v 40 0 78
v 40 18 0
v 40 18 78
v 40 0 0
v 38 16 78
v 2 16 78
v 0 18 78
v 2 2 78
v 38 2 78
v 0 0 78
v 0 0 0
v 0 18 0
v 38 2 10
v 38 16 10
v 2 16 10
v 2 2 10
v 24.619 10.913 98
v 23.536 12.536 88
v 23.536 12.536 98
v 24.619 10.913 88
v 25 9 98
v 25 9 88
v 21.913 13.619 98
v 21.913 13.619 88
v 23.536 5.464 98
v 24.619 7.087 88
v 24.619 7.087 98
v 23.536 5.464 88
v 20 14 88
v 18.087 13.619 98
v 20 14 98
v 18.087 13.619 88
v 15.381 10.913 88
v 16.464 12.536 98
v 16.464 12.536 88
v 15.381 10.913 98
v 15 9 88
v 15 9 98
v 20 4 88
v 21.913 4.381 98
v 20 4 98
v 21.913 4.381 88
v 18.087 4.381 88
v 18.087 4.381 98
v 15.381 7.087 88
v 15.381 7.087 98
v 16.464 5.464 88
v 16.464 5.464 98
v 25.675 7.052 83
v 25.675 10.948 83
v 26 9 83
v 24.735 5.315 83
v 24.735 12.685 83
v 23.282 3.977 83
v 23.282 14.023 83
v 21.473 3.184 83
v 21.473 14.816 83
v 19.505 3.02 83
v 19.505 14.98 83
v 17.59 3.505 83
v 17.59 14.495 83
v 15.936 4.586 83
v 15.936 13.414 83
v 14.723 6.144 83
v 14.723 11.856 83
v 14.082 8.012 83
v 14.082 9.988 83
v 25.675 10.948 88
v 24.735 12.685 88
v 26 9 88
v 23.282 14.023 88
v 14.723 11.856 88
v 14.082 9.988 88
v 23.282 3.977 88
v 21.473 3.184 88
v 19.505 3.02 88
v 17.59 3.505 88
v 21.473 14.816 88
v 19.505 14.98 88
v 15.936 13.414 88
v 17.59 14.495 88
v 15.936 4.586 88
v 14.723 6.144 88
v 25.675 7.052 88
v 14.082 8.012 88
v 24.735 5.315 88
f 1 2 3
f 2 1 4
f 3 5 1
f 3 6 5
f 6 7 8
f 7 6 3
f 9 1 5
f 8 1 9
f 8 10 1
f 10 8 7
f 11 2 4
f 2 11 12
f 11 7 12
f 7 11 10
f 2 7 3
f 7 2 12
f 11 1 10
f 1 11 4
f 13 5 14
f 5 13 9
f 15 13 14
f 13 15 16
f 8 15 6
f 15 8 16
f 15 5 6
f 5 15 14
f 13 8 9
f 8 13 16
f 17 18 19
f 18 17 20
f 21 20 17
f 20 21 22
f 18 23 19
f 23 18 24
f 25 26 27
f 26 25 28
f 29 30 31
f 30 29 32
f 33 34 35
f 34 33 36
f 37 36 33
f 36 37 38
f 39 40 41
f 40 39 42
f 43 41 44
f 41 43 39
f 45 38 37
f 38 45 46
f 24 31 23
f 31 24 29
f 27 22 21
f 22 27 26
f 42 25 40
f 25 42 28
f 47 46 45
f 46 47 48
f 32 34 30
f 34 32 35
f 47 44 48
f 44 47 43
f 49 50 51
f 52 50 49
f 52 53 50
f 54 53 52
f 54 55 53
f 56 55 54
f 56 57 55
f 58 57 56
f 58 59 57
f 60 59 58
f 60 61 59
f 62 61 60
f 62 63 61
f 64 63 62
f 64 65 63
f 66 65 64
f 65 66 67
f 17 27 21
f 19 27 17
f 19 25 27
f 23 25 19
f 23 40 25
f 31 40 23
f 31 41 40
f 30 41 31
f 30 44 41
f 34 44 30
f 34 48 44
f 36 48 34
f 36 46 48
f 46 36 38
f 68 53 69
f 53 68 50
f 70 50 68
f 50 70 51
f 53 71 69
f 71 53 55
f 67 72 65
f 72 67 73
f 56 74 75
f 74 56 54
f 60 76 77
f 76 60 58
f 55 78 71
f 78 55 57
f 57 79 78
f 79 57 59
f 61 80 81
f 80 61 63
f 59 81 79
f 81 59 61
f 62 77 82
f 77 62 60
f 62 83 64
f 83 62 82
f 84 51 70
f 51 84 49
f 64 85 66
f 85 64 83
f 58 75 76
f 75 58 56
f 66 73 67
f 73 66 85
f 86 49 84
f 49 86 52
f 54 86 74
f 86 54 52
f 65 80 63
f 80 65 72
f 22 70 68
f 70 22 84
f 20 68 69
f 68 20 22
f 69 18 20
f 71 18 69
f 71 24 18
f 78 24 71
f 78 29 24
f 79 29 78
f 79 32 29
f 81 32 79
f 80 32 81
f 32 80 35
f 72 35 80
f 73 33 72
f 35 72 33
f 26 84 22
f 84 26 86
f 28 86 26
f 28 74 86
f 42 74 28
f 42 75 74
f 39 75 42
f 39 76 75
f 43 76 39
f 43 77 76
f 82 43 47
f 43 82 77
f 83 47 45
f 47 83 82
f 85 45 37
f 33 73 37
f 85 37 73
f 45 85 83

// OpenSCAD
// Generated by SolidPython 1.0.0 on 2020-06-14 23:29:49


union() {
	difference() {
		color(c = [0.8500000000, 0.7000000000, 0.4500000000, 0.5000000000]) {
			cube(size = [40, 18, 78]);
		}
		color(c = [0.6500000000, 0.6700000000, 0.7200000000, 0.8000000000, 0.5000000000]) {
			translate(v = [2, 2, 10]) {
				cube(size = [36, 14, 79]);
			}
		}
	}
	translate(v = [0, 0, 78]) {
		polyhedron(faces = [[0, 1, 2, 3], [4, 5, 7, 6], [0, 4, 5, 1], [3, 6, 7, 2], [0, 4, 6, 3], [1, 2, 7, 5]], points = [[2, 2, 0], [38, 2, 0], [38, 16, 0], [2, 16, 0], [14, 2, 6], [26, 2, 6], [14, 16, 6], [26, 16, 6]]);
	}
	union() {
		translate(v = [20, 9, 83]) {
			cylinder(d = 5, h = 15, r = 40, r1 = 5, r2 = 5);
		}
		translate(v = [20, 9, 83]) {
			cylinder(d = 5, h = 5, r = 40, r1 = 6, r2 = 6);
		}
	}
}
